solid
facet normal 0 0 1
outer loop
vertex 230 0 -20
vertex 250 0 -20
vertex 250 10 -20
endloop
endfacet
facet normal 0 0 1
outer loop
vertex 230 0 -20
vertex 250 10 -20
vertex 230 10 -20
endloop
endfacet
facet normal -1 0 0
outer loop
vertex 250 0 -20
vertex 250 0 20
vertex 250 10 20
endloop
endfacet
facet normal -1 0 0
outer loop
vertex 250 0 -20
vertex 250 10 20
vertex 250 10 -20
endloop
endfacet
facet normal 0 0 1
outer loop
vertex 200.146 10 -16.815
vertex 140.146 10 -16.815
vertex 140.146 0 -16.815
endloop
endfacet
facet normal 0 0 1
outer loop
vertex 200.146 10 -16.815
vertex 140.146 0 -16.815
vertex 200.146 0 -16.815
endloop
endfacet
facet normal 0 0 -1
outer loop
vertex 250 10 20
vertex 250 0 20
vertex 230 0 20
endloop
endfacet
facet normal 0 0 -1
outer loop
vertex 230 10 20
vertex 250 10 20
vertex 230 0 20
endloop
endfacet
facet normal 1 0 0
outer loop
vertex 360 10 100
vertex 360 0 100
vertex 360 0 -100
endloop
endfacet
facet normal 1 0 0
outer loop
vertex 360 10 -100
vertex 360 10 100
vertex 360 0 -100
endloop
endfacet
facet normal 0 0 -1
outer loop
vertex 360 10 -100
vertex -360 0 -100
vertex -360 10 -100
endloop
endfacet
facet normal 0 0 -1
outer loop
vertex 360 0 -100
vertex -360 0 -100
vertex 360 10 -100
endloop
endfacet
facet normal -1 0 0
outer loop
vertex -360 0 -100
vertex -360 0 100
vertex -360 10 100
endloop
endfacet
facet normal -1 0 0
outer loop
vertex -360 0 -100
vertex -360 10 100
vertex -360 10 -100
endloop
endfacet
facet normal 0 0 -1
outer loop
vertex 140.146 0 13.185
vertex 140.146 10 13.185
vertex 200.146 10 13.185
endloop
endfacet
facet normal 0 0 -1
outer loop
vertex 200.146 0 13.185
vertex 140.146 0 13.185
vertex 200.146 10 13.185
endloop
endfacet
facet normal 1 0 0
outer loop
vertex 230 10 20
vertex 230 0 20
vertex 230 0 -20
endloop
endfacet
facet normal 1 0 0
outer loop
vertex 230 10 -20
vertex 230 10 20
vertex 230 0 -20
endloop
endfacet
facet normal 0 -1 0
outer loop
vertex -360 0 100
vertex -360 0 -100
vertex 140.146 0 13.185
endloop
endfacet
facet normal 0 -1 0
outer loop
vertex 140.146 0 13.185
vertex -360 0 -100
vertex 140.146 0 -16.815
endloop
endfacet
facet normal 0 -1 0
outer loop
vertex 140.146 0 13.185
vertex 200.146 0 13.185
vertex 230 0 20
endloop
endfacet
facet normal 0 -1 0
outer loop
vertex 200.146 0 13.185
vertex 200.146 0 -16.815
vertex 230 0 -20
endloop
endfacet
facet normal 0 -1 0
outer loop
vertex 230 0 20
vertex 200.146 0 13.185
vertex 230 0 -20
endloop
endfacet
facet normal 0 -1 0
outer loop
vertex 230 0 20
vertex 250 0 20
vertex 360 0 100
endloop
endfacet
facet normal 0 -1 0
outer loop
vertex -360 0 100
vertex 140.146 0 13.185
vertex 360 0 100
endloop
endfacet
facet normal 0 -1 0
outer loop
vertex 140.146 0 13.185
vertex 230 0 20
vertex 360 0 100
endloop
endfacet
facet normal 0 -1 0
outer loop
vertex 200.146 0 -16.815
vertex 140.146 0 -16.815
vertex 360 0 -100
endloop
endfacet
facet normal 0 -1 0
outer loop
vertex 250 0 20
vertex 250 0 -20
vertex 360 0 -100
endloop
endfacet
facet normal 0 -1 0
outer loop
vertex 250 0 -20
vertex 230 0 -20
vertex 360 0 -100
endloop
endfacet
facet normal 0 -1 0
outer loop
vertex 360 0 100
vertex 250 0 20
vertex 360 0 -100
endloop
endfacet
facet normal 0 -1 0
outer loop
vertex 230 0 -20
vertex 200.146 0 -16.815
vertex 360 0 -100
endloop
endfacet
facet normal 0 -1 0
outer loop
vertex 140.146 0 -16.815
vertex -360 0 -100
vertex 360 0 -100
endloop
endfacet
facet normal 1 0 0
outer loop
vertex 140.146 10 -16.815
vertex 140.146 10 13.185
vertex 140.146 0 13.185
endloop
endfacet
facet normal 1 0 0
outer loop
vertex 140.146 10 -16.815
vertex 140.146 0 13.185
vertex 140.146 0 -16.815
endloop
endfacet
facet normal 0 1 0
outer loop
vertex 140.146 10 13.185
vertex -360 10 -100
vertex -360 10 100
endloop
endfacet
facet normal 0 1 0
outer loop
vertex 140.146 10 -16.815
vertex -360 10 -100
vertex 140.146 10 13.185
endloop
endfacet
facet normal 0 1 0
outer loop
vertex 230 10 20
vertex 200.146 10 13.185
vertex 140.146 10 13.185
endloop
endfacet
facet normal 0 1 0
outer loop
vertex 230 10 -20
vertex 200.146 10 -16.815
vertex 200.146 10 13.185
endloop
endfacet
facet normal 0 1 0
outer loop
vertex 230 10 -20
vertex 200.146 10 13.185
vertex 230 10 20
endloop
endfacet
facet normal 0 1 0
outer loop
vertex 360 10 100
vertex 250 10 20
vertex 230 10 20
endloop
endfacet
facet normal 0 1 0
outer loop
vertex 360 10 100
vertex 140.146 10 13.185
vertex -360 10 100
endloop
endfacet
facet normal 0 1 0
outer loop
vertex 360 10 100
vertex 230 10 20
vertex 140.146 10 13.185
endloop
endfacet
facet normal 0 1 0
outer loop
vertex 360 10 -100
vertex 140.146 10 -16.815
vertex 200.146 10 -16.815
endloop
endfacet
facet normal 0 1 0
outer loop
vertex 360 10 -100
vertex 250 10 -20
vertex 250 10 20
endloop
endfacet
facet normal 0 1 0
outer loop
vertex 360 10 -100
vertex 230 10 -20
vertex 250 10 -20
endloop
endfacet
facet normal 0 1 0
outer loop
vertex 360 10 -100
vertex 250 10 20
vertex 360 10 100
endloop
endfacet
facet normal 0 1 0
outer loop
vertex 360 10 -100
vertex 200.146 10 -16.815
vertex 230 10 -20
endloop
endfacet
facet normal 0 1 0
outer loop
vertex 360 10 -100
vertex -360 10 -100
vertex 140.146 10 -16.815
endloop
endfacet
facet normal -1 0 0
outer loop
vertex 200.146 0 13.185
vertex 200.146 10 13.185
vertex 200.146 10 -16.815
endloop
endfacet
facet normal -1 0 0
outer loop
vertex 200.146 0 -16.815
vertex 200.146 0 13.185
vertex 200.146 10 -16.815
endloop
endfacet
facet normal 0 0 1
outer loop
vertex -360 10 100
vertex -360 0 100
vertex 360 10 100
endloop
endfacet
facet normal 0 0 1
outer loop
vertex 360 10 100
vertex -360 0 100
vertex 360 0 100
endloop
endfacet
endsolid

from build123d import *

# Parameters (mm, degrees)
CROQUIS1_W              = 720
CROQUIS1_H              = 200
SALIENTE_EXTRUIR1_DEPTH = 10
CROQUIS2_W              = 20
CROQUIS2_H              = 40
CORTAR_EXTRUIR1_DEPTH   = 10
CROQUIS3_W              = 60
CROQUIS3_H              = 30
CORTAR_EXTRUIR2_DEPTH   = 10


with BuildPart() as part:
    # Croquis1 → Saliente-Extruir1 (new body)
    with BuildSketch(Plane(origin=(0, 0, 0), x_dir=(1, 0, 0), z_dir=(0, 1, 0))):
        Rectangle(CROQUIS1_W, CROQUIS1_H)
    extrude(amount=SALIENTE_EXTRUIR1_DEPTH)

    # Croquis2 → Cortar-Extruir1 (cut)
    with BuildSketch(Plane(origin=(0, 0, 0), x_dir=(-1, 0, 0), z_dir=(0, -1, 0))):
        with Locations((-240, 0)):
            Rectangle(CROQUIS2_W, CROQUIS2_H)
    extrude(amount=-CORTAR_EXTRUIR1_DEPTH, mode=Mode.SUBTRACT)

    # Croquis3 → Cortar-Extruir2 (cut)
    with BuildSketch(Plane(origin=(0, 10, 0), x_dir=(1, 0, 0), z_dir=(0, 1, 0))):
        with Locations((170.145843921, 1.815492006)):
            Rectangle(CROQUIS3_W, CROQUIS3_H)
    extrude(amount=-CORTAR_EXTRUIR2_DEPTH, mode=Mode.SUBTRACT)


solid = part.part
